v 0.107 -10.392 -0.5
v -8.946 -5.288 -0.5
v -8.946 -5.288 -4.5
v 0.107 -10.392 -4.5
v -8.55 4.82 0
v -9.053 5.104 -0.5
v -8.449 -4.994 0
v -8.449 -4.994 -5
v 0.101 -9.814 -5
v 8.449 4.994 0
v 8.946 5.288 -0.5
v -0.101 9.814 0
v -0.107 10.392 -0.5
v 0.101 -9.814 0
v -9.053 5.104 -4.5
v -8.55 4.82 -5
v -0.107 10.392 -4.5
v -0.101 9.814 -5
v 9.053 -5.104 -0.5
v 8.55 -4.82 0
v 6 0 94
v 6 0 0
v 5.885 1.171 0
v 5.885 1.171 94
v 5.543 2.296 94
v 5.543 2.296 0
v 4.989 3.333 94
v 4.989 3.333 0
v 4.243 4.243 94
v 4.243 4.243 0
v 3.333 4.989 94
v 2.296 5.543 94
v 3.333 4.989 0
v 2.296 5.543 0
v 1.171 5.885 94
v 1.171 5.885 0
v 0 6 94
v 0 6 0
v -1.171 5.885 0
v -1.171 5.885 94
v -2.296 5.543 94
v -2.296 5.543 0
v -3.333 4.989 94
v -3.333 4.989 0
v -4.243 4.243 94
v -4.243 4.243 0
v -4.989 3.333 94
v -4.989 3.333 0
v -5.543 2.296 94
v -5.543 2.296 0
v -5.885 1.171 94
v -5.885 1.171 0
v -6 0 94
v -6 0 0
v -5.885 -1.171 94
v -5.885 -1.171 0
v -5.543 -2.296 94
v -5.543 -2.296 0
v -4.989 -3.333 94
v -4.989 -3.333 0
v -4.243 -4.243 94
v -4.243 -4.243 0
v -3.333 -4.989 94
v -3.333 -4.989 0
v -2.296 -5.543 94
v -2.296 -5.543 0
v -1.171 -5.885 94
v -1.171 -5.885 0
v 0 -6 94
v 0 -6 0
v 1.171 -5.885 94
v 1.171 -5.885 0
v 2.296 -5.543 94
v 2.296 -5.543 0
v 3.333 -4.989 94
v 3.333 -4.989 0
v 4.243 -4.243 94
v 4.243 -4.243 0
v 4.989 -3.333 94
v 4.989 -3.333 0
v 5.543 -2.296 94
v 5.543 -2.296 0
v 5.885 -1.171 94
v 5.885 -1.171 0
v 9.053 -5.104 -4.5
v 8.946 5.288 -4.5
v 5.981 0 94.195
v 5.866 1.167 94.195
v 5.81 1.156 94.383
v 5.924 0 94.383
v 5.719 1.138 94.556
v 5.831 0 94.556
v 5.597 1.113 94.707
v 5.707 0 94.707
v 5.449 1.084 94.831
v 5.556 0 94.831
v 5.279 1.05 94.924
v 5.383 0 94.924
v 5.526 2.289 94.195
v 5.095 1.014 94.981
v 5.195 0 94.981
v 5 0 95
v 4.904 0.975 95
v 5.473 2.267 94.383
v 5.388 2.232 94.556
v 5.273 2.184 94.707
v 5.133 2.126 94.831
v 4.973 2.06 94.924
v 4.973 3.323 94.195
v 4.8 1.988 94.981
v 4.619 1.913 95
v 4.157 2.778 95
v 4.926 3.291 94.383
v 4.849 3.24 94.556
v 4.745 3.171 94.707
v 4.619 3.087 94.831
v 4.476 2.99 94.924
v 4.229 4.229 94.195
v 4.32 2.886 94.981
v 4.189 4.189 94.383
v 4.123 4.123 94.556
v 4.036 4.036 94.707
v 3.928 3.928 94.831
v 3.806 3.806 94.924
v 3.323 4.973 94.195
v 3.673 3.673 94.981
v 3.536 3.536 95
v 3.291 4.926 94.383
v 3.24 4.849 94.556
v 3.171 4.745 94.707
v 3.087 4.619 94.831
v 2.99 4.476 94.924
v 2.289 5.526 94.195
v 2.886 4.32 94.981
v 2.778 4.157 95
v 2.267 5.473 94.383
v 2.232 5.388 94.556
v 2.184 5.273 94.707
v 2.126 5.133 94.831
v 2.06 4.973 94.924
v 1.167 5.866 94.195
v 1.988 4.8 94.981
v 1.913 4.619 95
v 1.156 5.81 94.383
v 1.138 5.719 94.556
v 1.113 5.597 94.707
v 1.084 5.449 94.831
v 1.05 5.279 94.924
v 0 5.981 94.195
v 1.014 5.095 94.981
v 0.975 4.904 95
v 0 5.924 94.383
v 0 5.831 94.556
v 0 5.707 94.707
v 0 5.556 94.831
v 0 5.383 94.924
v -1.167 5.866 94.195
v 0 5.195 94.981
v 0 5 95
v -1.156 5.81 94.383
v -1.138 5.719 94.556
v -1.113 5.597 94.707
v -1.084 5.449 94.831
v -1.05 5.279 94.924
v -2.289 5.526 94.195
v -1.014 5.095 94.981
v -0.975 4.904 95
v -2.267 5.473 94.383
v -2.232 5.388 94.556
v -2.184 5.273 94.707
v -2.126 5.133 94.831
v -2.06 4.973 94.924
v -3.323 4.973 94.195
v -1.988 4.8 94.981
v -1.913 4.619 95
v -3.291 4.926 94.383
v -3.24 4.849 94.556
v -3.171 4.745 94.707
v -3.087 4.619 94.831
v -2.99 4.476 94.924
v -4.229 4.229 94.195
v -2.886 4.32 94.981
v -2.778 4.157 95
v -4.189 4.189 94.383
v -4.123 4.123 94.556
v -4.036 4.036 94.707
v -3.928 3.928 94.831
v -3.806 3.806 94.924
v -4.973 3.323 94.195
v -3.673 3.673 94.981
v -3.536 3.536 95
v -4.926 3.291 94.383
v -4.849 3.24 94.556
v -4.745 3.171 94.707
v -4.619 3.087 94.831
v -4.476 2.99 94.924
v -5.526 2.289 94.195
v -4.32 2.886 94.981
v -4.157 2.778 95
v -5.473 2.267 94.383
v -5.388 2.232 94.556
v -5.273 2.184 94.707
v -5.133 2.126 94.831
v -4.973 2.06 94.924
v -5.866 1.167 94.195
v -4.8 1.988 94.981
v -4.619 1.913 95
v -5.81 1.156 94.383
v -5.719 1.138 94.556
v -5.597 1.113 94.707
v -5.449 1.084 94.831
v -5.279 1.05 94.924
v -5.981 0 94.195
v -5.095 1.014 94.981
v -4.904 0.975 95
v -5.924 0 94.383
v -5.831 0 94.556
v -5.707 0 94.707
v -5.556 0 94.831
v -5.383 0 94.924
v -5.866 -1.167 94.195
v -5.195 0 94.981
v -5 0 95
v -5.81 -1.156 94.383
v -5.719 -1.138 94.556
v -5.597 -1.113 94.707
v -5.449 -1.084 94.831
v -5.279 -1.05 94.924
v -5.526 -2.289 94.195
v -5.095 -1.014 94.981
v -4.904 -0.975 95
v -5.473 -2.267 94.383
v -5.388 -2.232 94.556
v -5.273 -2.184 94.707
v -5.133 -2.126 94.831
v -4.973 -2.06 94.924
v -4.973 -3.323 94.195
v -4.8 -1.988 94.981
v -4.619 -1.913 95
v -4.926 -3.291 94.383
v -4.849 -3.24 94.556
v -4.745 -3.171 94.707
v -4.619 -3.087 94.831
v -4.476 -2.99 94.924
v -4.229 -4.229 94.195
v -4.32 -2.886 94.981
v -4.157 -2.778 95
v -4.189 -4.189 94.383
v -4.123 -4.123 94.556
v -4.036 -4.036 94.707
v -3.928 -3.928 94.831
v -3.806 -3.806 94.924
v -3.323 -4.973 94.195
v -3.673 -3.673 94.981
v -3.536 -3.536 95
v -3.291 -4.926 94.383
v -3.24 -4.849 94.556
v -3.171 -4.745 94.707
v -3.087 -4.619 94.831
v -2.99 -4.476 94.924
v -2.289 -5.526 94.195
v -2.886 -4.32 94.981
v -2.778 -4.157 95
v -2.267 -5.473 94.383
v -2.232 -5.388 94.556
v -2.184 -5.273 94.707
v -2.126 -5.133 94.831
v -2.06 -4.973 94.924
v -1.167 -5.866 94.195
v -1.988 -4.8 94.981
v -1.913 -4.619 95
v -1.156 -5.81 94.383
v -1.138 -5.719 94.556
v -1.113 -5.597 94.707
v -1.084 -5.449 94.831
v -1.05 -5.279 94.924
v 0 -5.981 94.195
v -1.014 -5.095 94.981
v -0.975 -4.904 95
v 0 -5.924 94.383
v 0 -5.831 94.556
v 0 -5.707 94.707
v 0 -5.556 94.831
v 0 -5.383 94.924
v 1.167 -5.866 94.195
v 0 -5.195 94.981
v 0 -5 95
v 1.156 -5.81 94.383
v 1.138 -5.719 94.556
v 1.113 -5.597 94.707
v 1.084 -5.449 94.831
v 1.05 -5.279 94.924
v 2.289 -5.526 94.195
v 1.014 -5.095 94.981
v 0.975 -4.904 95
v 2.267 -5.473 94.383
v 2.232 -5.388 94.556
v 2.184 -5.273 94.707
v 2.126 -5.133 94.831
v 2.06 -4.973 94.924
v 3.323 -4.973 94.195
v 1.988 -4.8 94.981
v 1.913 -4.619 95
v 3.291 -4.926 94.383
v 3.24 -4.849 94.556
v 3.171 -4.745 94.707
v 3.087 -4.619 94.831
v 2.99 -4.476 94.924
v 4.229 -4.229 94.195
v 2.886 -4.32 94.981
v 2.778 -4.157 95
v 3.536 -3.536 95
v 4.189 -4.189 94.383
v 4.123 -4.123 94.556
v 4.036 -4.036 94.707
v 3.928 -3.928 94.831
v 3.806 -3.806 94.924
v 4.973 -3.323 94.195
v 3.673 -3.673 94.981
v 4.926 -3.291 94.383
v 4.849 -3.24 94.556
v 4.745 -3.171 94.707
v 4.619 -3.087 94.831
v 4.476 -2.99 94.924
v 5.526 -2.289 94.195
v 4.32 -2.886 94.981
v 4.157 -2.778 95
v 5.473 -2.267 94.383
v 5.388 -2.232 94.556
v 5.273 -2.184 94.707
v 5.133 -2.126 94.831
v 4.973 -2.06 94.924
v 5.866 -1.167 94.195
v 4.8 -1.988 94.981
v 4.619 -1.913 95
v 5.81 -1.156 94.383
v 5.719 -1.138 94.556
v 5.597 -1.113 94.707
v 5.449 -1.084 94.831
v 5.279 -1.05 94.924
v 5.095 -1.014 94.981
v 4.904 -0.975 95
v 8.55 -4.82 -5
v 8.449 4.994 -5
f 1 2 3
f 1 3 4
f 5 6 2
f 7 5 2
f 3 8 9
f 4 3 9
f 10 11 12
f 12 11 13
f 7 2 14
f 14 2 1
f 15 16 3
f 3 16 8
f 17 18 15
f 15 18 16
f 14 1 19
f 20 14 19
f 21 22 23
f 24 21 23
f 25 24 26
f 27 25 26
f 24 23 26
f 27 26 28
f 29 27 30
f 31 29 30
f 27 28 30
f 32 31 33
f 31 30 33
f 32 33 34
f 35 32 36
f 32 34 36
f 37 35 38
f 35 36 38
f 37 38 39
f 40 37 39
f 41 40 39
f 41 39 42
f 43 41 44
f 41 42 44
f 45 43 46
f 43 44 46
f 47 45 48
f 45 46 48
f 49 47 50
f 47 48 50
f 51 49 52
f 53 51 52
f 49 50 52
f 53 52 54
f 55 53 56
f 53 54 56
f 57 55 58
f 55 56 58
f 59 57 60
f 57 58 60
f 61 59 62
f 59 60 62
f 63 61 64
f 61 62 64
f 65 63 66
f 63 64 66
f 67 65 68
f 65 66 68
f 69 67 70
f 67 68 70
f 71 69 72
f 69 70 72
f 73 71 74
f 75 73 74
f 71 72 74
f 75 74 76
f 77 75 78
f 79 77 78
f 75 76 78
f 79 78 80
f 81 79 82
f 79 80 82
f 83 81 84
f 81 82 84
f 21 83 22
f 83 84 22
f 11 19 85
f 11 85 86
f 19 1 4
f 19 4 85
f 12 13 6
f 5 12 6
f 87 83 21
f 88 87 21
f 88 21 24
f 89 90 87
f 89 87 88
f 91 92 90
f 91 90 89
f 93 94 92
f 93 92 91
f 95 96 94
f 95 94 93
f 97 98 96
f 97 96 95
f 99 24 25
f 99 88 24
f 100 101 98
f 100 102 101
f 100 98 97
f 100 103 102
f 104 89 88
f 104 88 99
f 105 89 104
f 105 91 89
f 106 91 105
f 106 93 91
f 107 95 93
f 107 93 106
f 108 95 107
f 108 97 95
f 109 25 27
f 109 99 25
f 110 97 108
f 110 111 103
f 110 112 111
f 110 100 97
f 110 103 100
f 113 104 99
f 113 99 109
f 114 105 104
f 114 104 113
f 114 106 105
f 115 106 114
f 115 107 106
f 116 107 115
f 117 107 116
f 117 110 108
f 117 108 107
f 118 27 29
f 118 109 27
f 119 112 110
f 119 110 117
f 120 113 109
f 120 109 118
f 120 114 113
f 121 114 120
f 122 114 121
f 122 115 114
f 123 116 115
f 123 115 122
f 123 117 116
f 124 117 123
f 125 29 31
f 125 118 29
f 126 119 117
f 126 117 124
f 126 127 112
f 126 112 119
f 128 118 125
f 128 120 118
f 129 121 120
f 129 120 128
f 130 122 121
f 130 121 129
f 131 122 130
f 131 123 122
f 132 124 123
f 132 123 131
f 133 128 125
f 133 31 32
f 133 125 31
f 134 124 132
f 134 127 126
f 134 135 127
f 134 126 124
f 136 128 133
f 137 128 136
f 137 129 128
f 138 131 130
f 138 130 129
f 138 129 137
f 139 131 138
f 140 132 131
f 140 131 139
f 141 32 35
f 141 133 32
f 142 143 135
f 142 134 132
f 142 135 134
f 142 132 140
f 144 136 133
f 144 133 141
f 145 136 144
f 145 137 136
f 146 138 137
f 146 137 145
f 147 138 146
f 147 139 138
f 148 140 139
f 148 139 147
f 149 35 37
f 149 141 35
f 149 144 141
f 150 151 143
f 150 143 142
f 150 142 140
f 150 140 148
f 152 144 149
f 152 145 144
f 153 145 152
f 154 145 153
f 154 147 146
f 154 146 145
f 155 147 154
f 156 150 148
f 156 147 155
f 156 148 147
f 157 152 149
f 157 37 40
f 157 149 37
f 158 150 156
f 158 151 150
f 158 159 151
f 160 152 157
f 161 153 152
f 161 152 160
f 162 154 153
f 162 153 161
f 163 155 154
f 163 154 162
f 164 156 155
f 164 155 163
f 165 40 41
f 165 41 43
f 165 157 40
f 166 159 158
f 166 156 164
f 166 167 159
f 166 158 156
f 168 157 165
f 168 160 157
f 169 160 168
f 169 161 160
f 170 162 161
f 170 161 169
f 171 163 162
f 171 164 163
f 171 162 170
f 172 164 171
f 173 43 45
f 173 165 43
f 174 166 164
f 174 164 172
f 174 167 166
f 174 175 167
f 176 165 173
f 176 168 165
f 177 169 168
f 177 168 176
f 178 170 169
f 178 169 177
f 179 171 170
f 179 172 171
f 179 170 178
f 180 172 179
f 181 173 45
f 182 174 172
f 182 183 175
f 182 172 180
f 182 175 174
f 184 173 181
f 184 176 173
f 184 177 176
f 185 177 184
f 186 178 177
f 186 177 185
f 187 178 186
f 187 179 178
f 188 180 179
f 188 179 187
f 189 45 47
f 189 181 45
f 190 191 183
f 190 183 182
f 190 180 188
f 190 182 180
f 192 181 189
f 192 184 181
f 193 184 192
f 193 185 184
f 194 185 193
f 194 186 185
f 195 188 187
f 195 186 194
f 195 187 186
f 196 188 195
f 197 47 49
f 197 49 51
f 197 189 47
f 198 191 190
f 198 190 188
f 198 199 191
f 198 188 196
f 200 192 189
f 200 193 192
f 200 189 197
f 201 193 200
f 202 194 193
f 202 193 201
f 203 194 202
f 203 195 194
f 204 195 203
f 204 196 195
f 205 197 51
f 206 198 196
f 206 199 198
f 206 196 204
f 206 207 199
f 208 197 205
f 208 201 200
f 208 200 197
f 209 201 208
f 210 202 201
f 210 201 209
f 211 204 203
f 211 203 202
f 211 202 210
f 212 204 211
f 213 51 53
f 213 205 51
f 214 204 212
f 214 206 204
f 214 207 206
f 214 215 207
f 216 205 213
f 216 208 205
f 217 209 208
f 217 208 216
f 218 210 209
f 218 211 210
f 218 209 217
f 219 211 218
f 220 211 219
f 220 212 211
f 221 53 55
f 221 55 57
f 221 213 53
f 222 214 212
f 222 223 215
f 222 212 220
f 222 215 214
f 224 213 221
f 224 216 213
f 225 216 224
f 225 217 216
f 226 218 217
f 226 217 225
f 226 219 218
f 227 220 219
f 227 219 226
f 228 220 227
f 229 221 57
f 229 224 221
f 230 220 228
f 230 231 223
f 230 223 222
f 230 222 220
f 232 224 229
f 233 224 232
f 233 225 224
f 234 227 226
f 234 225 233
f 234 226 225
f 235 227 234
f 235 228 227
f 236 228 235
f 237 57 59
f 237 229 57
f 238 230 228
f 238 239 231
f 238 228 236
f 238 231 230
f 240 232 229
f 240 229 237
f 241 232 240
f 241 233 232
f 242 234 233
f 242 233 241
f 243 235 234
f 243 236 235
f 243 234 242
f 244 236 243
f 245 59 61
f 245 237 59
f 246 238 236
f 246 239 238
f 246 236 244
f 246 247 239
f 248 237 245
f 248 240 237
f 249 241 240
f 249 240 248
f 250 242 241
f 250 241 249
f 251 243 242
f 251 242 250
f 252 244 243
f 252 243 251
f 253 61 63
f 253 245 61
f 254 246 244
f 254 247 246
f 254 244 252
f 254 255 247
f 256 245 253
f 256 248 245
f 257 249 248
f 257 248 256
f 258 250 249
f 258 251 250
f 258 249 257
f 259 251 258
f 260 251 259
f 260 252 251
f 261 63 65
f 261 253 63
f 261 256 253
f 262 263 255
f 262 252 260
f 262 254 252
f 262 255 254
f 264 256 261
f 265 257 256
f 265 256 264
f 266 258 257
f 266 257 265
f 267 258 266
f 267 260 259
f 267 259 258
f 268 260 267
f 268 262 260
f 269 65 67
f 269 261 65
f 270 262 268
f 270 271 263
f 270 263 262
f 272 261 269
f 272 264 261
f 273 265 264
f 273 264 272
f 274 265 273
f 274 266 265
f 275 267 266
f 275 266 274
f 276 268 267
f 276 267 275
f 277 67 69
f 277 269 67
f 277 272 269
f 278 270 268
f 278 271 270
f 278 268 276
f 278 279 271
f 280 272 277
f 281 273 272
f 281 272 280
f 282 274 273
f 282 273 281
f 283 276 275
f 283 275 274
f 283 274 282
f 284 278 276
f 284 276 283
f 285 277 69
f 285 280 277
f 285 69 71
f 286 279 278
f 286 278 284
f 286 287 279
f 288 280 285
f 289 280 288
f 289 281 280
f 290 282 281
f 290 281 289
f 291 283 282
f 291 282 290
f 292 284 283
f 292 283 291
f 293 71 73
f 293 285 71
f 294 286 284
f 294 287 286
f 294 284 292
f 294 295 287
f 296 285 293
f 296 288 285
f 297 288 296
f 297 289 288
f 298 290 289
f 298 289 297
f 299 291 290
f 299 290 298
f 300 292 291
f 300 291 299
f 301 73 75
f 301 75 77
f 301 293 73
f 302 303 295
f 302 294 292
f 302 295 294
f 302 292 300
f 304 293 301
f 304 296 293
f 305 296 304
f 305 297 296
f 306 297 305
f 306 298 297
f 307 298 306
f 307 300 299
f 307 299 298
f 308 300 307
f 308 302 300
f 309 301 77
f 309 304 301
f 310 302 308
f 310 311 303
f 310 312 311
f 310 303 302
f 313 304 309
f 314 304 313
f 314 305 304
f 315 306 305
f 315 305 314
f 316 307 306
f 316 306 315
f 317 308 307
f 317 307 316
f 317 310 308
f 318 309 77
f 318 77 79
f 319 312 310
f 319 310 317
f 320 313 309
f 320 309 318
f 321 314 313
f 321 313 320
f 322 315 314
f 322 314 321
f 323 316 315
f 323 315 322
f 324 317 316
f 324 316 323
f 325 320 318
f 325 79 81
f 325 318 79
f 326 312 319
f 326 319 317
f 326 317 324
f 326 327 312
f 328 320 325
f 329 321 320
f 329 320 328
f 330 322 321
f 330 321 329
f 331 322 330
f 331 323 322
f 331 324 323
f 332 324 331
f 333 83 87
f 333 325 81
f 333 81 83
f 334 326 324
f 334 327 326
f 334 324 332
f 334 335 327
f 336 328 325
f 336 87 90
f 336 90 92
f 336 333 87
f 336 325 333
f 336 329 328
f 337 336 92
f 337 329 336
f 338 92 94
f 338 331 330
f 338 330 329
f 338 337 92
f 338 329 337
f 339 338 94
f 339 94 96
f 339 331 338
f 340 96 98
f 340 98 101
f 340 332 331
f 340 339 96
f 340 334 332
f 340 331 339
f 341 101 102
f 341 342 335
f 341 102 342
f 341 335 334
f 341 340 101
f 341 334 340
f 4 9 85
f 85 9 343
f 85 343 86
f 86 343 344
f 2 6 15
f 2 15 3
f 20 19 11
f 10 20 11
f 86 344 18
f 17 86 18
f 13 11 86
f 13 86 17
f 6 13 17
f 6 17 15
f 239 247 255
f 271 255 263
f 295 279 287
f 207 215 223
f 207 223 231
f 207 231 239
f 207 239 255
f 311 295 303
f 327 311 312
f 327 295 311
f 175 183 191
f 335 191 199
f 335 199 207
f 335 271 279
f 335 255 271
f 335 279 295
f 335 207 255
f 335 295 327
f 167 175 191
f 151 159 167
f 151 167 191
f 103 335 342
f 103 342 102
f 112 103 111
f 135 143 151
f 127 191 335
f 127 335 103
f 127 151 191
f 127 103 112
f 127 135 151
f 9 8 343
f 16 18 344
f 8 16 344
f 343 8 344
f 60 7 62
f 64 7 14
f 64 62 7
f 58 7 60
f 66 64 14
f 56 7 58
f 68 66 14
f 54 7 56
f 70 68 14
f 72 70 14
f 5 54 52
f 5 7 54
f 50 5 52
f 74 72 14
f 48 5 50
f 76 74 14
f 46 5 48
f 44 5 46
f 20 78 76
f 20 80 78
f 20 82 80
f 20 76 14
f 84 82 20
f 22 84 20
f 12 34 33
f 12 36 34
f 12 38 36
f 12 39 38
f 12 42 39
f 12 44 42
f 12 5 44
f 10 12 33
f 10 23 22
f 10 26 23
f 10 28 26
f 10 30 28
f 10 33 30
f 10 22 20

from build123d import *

# Parameters (mm, degrees)
F0_R      = 6
F1_DEPTH  = 95
F1_FACE_R = 6
F2_DEPTH  = 5
F3_R      = 1
F4_SIZE   = 0.5


with BuildPart() as f1:
    # F0 (on Top) → F1 (new body)
    with BuildSketch(Plane.XY):
        Circle(F0_R)
    extrude(amount=F1_DEPTH)

    # F0 (on Top) + F1_face (on face) → F2 (join)
    with BuildSketch(Plane.XY):
        Polygon((8.9462464611, 5.2881635996), (-0.1065607861, 10.3917585037), (-9.0528072472, 5.103594904), (-8.9462464611, -5.2881635996), (0.1065607861, -10.3917585037), (9.0528072472, -5.103594904), align=None)
        Circle(F0_R, mode=Mode.SUBTRACT)
    with BuildSketch(Plane(origin=(0, 0, 0), x_dir=(1, 0, 0), z_dir=(0, 0, -1))):
        Circle(F1_FACE_R)
    extrude(amount=-F2_DEPTH, dir=(0, 0, 1))

    # F3
    f3_edges = [f1.edges().sort_by_distance(p)[0] for p in [
        (-6, 0, 95),
    ]]
    fillet(f3_edges, radius=F3_R)

    # F4
    f4_edges = [f1.edges().sort_by_distance(p)[0] for p in [
        (4.419843, 7.839961, -5),
        (-4.579684, 7.747677, -5),
        (-8.999527, -0.092284, -5),
        (-4.419843, -7.839961, -5),
        (4.579684, -7.747677, -5),
        (8.999527, 0.092284, -5),
        (-4.579684, 7.747677, 0),
        (-8.999527, -0.092284, 0),
        (-4.419843, -7.839961, 0),
        (4.579684, -7.747677, 0),
        (4.419843, 7.839961, 0),
        (8.999527, 0.092284, 0),
    ]]
    chamfer(f4_edges, length=F4_SIZE)


solid = f1.part
